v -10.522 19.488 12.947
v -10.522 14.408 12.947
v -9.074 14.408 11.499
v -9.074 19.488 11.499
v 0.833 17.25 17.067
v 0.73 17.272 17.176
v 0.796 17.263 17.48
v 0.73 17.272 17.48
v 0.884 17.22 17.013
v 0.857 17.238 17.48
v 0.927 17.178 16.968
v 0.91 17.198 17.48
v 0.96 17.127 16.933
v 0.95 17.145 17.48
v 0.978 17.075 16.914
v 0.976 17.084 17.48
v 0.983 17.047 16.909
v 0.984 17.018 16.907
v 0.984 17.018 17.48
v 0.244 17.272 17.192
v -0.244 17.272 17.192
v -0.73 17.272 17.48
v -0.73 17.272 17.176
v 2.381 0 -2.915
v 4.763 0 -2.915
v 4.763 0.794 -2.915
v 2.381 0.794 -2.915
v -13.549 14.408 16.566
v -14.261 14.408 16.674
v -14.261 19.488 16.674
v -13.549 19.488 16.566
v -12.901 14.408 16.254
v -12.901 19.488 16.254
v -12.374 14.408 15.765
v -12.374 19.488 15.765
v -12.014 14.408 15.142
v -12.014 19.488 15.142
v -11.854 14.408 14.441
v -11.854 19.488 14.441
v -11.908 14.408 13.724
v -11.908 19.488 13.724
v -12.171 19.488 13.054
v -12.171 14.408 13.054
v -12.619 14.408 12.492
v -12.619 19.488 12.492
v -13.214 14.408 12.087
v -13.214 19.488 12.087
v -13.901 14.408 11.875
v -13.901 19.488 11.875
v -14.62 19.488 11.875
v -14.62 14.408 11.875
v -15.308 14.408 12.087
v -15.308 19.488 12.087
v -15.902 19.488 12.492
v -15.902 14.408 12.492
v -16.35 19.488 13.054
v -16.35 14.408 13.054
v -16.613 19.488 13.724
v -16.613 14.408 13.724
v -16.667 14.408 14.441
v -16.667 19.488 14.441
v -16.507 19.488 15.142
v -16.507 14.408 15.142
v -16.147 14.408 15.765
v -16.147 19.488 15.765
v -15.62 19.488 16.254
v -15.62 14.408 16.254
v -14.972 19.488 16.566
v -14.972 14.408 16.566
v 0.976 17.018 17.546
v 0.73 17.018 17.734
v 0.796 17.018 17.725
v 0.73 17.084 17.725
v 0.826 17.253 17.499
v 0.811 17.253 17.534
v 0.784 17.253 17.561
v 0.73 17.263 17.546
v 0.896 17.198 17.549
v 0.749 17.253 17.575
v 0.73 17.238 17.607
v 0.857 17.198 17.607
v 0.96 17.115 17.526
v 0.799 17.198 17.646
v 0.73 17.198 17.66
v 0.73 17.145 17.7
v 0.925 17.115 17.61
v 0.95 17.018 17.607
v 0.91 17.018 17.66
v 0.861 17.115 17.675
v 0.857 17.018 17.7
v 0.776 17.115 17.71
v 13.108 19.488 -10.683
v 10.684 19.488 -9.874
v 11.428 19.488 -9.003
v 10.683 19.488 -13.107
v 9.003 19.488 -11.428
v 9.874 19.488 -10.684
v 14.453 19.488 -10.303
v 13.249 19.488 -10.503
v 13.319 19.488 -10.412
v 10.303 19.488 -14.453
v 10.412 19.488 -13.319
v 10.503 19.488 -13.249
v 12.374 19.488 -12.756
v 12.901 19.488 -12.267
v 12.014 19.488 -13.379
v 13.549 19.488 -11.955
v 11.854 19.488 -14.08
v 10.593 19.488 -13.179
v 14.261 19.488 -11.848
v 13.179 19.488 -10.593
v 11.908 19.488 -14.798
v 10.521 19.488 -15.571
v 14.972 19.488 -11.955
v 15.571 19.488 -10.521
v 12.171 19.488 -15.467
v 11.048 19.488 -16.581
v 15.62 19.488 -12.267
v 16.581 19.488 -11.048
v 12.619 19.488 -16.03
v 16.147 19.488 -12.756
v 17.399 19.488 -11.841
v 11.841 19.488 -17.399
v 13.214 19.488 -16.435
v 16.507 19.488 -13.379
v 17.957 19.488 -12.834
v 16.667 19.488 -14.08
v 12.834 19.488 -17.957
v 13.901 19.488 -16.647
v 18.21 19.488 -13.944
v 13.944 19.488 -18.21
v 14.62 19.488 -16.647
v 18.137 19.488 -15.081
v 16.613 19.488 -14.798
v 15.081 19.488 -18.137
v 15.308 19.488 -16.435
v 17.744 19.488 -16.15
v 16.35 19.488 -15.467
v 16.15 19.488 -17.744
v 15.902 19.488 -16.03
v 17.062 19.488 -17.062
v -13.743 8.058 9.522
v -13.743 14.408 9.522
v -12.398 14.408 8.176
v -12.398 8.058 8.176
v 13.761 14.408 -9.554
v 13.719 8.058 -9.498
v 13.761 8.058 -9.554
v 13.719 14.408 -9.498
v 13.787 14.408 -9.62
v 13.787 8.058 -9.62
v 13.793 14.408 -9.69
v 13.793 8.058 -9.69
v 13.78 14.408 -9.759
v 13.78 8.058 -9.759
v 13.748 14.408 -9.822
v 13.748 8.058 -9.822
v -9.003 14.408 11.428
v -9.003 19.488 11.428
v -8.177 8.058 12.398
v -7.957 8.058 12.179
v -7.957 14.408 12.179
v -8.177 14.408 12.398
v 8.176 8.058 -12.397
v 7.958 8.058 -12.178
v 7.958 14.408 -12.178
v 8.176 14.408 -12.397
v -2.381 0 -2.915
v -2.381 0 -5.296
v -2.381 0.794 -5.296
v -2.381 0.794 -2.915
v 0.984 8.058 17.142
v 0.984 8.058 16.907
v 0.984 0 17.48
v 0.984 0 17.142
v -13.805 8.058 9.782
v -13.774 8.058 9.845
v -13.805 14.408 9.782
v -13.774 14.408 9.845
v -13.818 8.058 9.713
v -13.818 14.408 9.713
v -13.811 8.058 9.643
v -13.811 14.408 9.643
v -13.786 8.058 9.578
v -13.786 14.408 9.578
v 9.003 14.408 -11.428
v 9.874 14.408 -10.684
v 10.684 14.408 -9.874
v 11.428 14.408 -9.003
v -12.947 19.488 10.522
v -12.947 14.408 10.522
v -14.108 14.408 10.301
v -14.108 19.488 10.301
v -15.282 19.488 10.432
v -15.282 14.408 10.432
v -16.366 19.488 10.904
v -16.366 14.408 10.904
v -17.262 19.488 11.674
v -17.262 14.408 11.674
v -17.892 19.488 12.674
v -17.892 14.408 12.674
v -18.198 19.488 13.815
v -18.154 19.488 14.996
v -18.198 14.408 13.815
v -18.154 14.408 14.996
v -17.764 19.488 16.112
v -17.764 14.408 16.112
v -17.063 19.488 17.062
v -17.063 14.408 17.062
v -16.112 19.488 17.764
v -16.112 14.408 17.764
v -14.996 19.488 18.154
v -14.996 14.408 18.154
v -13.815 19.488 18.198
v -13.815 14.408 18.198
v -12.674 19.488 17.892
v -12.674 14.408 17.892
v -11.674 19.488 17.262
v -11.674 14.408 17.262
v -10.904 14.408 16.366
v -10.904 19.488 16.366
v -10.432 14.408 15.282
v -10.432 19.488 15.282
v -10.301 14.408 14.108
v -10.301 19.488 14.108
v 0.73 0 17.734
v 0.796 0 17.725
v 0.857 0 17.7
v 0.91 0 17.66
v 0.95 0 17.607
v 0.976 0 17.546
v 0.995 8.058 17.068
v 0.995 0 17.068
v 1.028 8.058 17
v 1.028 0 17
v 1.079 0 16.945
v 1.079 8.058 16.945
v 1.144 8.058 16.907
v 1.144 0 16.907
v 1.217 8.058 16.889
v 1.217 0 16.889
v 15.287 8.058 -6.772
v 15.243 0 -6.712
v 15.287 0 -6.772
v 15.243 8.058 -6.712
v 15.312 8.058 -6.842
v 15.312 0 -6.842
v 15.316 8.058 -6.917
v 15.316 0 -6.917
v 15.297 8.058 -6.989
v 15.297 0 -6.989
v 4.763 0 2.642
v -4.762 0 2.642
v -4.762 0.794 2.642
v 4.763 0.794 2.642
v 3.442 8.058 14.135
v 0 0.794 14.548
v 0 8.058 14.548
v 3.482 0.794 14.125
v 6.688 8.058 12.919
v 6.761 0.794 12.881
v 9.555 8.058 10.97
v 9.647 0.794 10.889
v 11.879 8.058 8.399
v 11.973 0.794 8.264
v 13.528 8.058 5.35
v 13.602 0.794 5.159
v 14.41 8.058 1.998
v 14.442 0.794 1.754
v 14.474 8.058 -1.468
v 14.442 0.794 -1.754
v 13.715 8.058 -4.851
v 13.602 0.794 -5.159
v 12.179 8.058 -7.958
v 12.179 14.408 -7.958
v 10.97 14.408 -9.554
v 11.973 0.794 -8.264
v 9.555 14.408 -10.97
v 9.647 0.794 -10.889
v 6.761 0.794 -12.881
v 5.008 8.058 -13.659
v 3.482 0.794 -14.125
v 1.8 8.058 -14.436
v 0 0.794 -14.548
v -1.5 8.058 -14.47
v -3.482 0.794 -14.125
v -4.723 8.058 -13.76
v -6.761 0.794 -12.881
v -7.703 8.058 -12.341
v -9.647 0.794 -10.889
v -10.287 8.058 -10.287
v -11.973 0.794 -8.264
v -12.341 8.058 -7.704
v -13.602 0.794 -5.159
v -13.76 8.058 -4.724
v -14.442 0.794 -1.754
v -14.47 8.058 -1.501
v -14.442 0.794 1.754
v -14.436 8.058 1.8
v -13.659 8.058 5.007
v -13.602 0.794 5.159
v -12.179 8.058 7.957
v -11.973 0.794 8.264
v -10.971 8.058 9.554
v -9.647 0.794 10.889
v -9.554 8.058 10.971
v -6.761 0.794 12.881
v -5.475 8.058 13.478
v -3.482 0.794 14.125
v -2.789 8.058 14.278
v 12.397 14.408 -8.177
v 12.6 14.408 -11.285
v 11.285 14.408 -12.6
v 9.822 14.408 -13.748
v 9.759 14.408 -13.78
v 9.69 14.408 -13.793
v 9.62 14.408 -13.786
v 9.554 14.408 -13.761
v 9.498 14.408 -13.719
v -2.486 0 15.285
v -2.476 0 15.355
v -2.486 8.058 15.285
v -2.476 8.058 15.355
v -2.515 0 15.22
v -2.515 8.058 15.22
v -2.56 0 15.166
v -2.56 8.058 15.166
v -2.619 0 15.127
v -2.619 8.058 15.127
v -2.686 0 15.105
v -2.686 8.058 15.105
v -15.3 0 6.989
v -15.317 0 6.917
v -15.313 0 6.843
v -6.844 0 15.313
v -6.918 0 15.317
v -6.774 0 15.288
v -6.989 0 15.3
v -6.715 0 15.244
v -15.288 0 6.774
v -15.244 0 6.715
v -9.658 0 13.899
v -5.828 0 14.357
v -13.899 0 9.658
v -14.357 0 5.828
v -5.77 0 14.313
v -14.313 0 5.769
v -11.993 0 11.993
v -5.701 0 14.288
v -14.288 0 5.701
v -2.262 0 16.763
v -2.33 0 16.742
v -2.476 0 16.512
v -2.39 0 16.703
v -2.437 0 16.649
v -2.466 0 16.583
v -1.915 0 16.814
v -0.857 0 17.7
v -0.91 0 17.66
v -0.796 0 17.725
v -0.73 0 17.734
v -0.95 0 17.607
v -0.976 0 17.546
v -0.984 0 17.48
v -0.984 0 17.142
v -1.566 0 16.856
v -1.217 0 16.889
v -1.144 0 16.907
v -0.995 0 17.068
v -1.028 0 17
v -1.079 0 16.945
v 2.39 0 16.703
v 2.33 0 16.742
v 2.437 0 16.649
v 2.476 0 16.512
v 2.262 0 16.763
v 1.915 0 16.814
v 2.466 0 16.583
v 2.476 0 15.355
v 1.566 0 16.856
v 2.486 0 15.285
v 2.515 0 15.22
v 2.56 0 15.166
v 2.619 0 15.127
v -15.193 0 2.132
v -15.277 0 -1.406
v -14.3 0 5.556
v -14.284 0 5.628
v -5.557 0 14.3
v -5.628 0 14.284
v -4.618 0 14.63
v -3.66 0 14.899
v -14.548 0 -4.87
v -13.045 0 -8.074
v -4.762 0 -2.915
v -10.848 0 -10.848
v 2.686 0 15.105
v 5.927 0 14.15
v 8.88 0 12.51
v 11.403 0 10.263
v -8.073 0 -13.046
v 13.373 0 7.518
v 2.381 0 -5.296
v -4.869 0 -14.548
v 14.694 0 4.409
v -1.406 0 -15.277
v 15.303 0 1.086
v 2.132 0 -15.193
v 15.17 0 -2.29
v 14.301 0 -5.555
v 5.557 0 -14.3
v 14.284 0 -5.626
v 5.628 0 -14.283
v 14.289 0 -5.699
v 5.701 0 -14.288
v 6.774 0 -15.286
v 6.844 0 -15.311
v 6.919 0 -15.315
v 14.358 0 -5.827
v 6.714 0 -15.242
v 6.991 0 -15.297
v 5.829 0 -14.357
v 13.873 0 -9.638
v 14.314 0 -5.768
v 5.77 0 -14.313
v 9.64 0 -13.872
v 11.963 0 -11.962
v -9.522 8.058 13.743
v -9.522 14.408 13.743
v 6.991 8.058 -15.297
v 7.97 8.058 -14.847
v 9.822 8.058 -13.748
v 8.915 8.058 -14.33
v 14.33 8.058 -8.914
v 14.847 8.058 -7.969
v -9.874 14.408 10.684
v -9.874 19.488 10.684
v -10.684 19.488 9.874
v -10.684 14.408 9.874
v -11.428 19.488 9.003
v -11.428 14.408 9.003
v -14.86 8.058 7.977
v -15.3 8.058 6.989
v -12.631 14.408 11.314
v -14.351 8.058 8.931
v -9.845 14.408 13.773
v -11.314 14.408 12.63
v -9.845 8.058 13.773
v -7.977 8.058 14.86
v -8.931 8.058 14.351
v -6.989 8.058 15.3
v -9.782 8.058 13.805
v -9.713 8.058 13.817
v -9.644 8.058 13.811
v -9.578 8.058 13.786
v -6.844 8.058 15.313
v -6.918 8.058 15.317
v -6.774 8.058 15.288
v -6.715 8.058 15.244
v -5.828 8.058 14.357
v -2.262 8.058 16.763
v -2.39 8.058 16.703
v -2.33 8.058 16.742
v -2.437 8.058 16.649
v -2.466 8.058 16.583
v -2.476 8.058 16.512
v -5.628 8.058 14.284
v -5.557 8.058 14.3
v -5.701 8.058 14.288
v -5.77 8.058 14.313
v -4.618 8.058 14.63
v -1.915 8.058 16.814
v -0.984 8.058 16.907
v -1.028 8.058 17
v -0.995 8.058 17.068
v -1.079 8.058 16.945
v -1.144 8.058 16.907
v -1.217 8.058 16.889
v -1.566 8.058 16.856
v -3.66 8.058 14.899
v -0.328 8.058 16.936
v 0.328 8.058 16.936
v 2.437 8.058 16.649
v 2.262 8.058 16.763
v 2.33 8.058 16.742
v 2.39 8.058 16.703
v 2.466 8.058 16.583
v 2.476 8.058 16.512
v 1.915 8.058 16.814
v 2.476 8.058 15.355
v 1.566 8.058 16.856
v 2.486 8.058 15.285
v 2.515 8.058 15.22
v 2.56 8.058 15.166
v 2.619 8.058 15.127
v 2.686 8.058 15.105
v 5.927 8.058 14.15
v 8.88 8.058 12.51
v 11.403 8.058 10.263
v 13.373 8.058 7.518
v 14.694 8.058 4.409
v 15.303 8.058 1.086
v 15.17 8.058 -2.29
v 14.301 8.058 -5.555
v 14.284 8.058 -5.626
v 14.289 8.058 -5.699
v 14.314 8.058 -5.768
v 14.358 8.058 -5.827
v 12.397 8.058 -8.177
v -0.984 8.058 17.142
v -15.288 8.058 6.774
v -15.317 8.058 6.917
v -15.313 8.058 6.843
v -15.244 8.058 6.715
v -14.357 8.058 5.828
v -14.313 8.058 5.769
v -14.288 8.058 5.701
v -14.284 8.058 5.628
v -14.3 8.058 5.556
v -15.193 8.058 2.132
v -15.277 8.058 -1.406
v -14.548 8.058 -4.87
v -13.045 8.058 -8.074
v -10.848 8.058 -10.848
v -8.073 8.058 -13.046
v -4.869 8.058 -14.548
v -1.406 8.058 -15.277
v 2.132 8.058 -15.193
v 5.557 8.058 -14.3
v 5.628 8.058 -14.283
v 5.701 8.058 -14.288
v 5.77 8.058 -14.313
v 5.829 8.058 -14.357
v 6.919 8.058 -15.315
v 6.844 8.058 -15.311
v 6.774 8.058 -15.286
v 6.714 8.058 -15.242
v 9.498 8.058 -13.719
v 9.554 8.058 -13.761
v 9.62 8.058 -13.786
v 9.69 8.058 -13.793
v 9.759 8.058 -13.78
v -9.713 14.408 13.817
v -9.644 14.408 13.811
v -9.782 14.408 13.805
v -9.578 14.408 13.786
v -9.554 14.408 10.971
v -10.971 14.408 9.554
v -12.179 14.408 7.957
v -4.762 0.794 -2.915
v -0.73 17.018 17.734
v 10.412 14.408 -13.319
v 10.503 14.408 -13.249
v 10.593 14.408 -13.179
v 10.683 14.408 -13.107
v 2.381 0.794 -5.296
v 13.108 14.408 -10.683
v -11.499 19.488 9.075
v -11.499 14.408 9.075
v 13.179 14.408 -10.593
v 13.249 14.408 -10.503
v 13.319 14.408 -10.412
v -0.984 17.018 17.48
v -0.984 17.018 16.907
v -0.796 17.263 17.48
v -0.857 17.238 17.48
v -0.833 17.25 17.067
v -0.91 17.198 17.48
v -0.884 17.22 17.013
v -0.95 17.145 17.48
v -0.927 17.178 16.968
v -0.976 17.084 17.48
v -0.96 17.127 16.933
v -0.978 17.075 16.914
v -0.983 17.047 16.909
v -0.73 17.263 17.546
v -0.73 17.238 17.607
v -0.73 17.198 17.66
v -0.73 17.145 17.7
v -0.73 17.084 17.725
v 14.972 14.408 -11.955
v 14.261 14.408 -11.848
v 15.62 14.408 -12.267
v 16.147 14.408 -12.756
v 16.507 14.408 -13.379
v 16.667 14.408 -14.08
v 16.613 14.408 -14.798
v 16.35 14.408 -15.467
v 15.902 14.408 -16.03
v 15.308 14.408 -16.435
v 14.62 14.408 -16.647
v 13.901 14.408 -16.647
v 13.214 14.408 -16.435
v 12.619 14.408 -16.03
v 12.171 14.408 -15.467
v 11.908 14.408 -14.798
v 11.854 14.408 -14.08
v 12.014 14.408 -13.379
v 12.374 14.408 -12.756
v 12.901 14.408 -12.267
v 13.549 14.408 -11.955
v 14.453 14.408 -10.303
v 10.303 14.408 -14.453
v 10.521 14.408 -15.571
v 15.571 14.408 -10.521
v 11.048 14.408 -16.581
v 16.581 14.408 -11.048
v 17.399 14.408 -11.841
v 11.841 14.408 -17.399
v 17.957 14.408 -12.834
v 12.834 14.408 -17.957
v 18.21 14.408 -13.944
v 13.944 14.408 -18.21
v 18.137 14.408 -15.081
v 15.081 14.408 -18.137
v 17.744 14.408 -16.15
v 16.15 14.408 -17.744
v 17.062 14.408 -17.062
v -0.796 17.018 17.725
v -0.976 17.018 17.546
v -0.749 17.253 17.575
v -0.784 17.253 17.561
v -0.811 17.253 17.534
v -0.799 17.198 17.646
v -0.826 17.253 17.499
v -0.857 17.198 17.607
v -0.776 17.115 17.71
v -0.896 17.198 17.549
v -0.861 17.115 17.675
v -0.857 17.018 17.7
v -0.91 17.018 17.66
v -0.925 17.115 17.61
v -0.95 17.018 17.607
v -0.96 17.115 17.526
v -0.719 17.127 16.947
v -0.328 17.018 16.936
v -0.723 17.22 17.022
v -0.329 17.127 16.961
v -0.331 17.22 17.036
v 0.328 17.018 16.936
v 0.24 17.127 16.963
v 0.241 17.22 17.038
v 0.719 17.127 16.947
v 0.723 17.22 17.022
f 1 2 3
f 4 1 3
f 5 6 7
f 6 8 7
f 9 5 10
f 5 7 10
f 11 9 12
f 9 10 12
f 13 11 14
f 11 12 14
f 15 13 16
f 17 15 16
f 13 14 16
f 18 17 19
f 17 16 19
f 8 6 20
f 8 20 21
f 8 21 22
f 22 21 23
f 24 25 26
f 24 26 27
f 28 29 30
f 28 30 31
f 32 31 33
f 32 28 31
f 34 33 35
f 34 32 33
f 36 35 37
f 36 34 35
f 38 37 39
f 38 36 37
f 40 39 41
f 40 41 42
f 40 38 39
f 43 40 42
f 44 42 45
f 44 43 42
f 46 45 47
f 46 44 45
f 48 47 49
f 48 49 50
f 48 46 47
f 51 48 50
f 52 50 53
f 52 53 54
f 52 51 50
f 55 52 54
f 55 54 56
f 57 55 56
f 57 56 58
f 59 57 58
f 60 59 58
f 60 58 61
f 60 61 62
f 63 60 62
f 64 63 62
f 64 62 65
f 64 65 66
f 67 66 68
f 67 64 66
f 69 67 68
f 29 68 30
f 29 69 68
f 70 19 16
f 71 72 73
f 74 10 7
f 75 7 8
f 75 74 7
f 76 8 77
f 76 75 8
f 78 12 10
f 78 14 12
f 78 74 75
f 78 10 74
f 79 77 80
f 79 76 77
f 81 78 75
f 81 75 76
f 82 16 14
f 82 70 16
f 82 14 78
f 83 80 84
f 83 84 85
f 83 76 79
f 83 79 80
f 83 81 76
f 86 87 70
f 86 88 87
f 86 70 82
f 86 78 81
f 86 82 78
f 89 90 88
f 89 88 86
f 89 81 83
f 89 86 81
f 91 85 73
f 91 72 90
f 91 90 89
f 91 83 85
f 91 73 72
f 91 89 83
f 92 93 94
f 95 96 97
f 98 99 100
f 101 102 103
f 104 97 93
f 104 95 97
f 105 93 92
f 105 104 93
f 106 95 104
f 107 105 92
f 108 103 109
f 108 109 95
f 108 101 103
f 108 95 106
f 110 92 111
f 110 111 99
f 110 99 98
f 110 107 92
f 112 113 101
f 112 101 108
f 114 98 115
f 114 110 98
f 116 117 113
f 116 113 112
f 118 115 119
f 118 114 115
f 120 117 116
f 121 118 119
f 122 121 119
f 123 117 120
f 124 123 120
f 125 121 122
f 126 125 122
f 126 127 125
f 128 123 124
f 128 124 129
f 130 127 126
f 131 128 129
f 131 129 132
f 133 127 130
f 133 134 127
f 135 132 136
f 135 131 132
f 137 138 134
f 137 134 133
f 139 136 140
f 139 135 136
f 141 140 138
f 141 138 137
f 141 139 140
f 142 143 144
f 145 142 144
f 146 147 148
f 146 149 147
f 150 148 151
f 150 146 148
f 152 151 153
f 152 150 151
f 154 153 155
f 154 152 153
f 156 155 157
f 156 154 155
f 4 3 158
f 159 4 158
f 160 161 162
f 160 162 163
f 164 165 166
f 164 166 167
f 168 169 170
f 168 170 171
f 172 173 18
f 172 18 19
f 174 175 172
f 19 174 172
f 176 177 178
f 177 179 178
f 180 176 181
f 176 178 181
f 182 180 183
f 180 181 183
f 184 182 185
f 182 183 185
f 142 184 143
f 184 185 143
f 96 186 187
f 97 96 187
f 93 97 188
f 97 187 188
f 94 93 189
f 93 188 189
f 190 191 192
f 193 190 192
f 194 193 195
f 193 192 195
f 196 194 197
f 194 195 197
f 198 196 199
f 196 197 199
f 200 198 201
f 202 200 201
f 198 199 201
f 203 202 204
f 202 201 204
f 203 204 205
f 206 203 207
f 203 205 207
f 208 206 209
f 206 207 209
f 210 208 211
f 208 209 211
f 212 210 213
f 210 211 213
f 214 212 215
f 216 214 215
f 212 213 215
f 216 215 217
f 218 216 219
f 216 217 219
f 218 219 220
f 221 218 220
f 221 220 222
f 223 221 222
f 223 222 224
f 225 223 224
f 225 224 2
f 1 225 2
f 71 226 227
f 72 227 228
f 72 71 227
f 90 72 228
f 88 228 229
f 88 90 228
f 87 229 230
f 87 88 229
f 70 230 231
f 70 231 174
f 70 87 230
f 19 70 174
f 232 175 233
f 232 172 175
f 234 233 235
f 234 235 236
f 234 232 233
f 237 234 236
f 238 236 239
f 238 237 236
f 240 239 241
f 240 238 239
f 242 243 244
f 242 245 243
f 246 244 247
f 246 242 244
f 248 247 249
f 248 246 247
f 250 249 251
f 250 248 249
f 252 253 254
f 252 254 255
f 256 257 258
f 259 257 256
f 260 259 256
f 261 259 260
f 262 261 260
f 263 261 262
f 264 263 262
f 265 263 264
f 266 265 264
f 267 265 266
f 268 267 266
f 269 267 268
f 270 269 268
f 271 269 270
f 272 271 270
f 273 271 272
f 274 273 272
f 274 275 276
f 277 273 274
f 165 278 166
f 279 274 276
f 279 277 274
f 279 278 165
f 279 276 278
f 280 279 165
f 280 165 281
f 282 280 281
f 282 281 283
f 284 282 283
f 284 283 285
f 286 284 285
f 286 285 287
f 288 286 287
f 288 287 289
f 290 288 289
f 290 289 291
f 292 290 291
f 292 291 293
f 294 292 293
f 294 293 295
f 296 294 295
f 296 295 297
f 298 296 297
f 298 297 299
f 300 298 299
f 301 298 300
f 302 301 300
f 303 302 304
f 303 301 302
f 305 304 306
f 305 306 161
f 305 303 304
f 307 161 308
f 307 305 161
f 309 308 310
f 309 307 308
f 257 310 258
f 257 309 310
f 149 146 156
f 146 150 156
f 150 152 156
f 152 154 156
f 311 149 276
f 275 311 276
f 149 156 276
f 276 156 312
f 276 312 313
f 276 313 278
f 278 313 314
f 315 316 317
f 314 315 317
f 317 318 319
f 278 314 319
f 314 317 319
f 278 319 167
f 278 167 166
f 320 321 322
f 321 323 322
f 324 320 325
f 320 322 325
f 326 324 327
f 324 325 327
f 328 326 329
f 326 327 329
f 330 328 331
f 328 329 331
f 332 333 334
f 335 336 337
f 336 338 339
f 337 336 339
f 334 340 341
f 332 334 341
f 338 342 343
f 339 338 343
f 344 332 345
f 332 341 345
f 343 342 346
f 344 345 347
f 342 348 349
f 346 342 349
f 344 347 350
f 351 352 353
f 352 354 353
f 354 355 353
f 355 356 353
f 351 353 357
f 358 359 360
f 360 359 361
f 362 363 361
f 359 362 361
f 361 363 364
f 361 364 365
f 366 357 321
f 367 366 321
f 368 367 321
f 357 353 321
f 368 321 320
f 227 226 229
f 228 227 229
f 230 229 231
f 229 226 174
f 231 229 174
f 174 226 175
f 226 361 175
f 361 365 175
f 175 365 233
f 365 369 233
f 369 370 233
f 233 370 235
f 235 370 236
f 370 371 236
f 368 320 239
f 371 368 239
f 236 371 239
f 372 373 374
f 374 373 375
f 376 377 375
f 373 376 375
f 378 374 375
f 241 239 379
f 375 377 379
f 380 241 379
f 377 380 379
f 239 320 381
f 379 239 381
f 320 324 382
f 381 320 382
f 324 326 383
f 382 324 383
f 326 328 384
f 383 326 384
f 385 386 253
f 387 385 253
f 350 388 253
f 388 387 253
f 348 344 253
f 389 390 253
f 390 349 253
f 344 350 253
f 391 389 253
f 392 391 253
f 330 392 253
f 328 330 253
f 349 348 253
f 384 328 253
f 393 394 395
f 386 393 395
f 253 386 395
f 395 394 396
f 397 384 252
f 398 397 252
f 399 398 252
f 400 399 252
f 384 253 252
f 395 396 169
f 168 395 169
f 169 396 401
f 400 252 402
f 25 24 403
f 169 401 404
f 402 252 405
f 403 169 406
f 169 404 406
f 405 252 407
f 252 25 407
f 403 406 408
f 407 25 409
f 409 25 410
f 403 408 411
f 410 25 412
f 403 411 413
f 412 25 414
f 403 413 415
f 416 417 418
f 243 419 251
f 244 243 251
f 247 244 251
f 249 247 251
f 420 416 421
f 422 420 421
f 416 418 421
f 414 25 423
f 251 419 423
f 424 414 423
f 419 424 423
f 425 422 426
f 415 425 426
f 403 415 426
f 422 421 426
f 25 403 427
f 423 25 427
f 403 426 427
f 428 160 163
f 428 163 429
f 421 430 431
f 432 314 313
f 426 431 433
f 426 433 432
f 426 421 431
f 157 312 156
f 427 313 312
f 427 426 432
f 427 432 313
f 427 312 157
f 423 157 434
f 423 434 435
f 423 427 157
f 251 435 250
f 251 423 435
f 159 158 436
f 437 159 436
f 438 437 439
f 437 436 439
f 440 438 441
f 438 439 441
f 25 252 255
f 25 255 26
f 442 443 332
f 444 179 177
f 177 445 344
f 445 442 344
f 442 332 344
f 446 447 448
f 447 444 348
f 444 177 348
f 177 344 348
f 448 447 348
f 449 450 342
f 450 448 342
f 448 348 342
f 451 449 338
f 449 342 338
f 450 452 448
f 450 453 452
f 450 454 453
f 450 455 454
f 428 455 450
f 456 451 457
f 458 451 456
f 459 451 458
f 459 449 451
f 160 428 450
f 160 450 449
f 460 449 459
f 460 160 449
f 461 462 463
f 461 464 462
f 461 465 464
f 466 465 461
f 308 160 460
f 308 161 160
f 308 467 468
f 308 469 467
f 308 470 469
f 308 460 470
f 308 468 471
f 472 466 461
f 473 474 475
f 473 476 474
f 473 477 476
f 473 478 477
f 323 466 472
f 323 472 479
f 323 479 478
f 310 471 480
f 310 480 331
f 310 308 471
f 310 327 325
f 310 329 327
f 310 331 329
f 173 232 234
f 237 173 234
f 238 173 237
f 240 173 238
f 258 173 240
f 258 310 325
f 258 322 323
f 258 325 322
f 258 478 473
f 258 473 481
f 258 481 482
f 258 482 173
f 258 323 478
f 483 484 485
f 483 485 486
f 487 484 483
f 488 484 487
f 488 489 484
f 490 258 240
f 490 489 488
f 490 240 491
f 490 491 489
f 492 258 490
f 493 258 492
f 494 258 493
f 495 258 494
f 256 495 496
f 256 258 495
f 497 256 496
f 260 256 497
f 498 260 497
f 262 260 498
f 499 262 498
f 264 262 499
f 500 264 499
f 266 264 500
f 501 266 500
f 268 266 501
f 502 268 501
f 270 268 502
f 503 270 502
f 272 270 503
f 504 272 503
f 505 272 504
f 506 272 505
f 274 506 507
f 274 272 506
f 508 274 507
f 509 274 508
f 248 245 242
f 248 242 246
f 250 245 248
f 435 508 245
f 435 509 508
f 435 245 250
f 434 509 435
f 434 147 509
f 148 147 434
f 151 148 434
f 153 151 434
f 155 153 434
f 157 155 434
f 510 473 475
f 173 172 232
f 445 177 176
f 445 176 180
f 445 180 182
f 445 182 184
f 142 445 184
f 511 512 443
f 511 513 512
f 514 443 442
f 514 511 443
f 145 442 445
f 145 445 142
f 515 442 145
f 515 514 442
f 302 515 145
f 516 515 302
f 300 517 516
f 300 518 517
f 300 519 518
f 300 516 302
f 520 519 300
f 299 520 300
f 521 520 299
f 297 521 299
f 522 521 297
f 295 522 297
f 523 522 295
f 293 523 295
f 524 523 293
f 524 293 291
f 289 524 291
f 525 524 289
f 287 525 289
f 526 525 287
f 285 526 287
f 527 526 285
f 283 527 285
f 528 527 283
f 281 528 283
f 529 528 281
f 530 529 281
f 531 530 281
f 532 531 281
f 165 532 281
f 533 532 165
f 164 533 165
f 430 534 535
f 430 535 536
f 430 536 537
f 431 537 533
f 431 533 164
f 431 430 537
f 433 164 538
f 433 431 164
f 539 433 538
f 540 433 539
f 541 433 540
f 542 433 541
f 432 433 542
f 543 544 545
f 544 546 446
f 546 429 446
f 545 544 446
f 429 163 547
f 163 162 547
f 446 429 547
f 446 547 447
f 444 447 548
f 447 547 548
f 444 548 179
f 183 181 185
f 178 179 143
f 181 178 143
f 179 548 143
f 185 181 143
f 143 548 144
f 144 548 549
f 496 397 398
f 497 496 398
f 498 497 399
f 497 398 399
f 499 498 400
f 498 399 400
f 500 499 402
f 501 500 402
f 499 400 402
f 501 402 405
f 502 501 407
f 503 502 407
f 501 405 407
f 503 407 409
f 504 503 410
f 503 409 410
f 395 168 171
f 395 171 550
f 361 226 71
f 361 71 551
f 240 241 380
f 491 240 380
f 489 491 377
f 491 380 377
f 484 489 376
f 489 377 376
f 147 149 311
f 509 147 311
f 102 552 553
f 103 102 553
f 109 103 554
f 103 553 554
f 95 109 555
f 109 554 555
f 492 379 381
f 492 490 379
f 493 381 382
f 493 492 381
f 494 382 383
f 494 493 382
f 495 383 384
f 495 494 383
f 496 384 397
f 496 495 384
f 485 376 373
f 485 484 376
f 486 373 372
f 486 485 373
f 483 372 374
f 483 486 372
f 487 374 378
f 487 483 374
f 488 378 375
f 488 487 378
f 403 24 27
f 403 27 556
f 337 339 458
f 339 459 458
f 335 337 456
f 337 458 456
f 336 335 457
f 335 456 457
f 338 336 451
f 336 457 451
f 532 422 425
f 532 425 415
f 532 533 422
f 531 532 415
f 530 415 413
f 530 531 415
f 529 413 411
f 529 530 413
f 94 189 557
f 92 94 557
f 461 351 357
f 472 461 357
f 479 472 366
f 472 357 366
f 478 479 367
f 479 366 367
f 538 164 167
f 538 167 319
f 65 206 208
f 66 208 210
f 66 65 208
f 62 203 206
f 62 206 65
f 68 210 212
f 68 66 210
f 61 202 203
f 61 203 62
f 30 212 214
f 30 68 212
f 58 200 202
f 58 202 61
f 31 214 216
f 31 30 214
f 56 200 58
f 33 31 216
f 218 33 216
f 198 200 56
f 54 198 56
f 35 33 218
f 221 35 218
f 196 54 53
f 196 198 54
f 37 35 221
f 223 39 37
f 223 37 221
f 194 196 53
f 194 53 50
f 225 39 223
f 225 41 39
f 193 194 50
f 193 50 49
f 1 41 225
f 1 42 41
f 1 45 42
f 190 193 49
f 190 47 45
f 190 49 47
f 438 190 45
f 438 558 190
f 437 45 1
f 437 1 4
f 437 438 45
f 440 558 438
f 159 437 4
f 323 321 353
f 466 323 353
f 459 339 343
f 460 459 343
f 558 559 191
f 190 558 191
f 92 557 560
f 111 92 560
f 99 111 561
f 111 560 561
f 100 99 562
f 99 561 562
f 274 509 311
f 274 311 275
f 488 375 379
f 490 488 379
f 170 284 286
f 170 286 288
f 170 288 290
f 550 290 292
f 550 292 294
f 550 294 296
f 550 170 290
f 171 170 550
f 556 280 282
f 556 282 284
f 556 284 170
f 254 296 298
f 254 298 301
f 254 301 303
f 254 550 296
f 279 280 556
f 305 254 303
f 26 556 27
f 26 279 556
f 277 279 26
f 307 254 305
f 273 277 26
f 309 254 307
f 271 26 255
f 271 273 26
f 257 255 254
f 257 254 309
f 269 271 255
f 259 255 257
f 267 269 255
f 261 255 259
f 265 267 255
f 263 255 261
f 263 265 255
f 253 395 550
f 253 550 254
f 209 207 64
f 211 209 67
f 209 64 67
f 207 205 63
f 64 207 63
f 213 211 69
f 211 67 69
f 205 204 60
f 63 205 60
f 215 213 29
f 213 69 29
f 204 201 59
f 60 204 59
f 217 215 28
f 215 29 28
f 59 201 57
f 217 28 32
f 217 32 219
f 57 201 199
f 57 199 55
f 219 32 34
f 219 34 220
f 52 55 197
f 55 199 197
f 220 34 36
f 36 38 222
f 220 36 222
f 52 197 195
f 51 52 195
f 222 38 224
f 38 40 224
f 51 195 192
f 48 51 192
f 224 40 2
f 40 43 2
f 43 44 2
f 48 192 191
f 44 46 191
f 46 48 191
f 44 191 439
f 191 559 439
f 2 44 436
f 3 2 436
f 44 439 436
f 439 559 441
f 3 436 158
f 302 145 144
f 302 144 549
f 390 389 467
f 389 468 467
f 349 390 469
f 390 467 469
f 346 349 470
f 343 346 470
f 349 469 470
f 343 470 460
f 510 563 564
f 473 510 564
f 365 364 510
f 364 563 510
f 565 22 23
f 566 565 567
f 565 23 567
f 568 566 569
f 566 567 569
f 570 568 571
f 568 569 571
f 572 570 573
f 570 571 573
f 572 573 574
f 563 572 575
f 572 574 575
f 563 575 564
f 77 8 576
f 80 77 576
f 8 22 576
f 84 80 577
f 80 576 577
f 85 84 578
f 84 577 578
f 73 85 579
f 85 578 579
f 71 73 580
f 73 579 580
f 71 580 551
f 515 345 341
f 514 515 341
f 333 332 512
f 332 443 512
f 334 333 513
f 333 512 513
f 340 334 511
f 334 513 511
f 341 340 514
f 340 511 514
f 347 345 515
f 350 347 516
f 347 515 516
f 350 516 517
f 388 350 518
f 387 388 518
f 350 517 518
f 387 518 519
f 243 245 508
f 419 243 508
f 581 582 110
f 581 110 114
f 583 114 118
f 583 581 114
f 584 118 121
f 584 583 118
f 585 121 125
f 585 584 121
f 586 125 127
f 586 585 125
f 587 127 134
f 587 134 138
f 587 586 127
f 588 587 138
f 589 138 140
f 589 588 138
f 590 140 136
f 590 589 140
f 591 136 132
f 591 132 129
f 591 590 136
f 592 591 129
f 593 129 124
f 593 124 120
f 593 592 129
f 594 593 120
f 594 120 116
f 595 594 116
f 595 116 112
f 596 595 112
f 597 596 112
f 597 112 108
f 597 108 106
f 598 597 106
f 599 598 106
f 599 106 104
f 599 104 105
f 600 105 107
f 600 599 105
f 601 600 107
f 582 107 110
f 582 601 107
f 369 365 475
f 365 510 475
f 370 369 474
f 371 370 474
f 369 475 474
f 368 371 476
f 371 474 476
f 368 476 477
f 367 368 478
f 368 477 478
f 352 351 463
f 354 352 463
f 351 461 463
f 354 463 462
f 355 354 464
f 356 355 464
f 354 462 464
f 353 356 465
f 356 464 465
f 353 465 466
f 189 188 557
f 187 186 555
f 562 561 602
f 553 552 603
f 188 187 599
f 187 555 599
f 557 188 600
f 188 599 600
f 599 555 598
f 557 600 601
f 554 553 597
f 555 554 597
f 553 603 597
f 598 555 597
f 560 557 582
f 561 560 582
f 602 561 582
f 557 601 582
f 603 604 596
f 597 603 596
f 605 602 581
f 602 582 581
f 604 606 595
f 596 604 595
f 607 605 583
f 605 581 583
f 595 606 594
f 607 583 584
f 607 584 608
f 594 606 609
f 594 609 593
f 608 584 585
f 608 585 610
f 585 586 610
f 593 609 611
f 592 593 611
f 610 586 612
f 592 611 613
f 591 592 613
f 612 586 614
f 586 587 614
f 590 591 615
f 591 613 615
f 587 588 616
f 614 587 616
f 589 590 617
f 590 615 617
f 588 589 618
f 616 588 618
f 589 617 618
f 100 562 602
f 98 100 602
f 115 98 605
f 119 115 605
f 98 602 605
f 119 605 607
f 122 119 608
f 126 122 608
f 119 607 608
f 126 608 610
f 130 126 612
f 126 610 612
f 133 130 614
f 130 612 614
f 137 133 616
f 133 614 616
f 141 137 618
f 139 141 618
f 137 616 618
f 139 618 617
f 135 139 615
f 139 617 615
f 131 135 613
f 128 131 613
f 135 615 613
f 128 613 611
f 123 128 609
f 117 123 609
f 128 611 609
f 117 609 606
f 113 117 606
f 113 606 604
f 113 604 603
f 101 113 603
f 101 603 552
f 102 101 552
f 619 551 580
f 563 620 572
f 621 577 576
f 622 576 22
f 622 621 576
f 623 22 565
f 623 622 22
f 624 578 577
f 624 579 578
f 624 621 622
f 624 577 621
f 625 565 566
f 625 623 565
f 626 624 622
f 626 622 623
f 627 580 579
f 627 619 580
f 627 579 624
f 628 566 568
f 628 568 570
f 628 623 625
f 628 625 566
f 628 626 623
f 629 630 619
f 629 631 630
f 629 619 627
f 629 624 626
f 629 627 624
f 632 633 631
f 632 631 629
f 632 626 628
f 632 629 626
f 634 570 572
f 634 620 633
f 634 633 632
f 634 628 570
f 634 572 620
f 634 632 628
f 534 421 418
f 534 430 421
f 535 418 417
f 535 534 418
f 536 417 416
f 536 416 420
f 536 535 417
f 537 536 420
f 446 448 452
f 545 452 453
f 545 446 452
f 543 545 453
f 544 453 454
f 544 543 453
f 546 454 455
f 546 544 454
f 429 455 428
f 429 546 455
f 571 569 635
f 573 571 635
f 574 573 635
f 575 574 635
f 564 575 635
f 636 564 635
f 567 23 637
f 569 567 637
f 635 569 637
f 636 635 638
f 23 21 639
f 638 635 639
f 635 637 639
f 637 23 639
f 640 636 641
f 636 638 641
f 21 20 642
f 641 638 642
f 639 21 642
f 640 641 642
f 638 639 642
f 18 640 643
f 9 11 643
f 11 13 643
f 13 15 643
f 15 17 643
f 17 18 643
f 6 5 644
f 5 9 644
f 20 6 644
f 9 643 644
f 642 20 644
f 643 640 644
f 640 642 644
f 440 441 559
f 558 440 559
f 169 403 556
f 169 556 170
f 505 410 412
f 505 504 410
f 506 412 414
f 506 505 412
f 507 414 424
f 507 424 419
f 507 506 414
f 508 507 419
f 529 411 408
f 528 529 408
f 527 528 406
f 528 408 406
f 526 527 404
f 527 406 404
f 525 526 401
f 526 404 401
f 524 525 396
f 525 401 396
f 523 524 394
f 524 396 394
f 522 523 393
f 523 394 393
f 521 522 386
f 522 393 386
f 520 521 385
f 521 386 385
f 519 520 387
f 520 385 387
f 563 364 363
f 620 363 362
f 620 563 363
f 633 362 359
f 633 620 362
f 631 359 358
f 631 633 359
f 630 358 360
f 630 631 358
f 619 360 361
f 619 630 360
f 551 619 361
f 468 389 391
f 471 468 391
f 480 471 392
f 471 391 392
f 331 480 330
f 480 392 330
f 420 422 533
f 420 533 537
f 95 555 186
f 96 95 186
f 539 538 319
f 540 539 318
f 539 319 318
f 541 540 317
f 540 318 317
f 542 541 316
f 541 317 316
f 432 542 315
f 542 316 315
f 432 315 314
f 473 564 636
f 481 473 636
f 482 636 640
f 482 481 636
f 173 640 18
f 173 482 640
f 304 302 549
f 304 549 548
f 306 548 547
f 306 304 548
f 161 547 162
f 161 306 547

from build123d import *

# Parameters (mm, degrees)
SKETCH1_R             = 15.341599999999996
BOSS_EXTRUDE1_DEPTH   = 0.79375
SKETCH2_R             = 15.341599999999996
SKETCH2_R_2           = 14.547849999999999
BOSS_EXTRUDE2_DEPTH   = 7.264399999999999
CUT_EXTRUDE1_DEPTH    = 2.54
BOSS_EXTRUDE3_DEPTH   = 8.05815
BOSS_EXTRUDE4_START   = -8.05815
BOSS_EXTRUDE4_DEPTH   = 8.05815
BOSS_EXTRUDE5_DEPTH   = 9.21385
BOSS_EXTRUDE6_DEPTH   = 8.05815
BOSS_EXTRUDE7_DEPTH   = 6.35
SKETCH8_R             = 2.4130000000000007
BOSS_EXTRUDE9_DEPTH   = 5.08
BOSS_EXTRUDE9_2_DEPTH = 5.08
FILLET2_R             = 0.254
FILLET3_R             = 0.254
FILLET4_R             = 0.254
FILLET5_R             = 0.254


with BuildPart() as part:
    # Sketch1 → Boss-Extrude1 (new body)
    with BuildSketch(Plane(origin=(0, 0, 0), x_dir=(1, 0, 0), z_dir=(0, 1, 0))):
        Circle(SKETCH1_R)
    extrude(amount=BOSS_EXTRUDE1_DEPTH)

    # Sketch2 → Boss-Extrude2 (add)
    with BuildSketch(Plane(origin=(0, 0.79375, 0), x_dir=(1, 0, 0), z_dir=(0, 1, 0))):
        Circle(SKETCH2_R)
        Circle(SKETCH2_R_2, mode=Mode.SUBTRACT)
    extrude(amount=BOSS_EXTRUDE2_DEPTH)

    # Sketch3 → Cut-Extrude1 (cut)
    with BuildSketch(Plane.XZ):
        Polygon((-4.762499999999998, 2.6415999999999973), (4.762500000000002, 2.641599999999999), (4.762500000000002, -2.914650000000002), (2.38125, -2.9146500000000013), (2.3812499999999996, -5.295900000000002), (-2.3812499999999996, -5.295900000000002), (-2.38125, -2.914650000000002), (-4.762499999999998, -2.914650000000002), align=None)
    extrude(amount=-CUT_EXTRUDE1_DEPTH, mode=Mode.SUBTRACT)

    # Sketch4 → Boss-Extrude3 (add)
    with BuildSketch(Plane(origin=(0, 0, 0), x_dir=(-1, 0, 0), z_dir=(0, -1, 0))):
        with BuildLine():
            Line((2.4765, -15.140397561160668), (2.4765, -16.727897561160667))
            ThreePointArc((2.4765, -16.727897561160667), (8.9e-16, -16.94015526812513), (-2.4765, -16.727897561160667))
            Line((-2.4765, -16.727897561160667), (-2.4765, -15.140397561160668))
            ThreePointArc((-2.4765, -15.140397561160668), (9.4e-16, -15.341599999999993), (2.4765, -15.140397561160668))
        make_face()
    extrude(amount=-BOSS_EXTRUDE3_DEPTH)

    # Sketch5 → Boss-Extrude4 (add)
    with BuildSketch(Plane(origin=(0, 8.058149999999998, 0), x_dir=(1, 0, 0), z_dir=(0, 1, 0)).offset(BOSS_EXTRUDE4_START)):
        with BuildLine():
            Line((-0.9842499999999998, -17.733905268125135), (-0.9842499999999998, -16.906834389214747))
            ThreePointArc((-0.9842499999999998, -16.906834389214747), (8.9e-16, -16.94015526812513), (0.9842499999999998, -16.906834389214747))
            Line((0.9842499999999998, -16.906834389214747), (0.9842499999999998, -17.733905268125135))
            Line((0.9842499999999998, -17.733905268125135), (-0.9842499999999998, -17.733905268125135))
        make_face()
    extrude(amount=BOSS_EXTRUDE4_DEPTH)

    # Sketch5<2> → Boss-Extrude5 (add)
    with BuildSketch(Plane(origin=(0, 8.058149999999998, 0), x_dir=(1, 0, 0), z_dir=(0, 1, 0))):
        with BuildLine():
            Line((-0.9842499999999998, -17.733905268125135), (-0.9842499999999998, -16.906834389214747))
            ThreePointArc((-0.9842499999999998, -16.906834389214747), (8.9e-16, -16.94015526812513), (0.9842499999999998, -16.906834389214747))
            Line((0.9842499999999998, -16.906834389214747), (0.9842499999999998, -17.733905268125135))
            Line((0.9842499999999998, -17.733905268125135), (-0.9842499999999998, -17.733905268125135))
        make_face()
    extrude(amount=BOSS_EXTRUDE5_DEPTH)

    # Sketch6 → Boss-Extrude6 (add)
    with BuildSketch(Plane.XZ):
        with BuildLine():
            Line((-14.239356652921419, 5.7101149437557215), (-15.361888668055064, 6.832646958889366))
            ThreePointArc((-15.361888668055064, 6.832646958889366), (-11.992928475384156, 11.99273189026442), (-6.832904471189303, 15.361785400515926))
            Line((-6.832904471189303, 15.361785400515926), (-5.710372456055659, 14.239253385382282))
            ThreePointArc((-5.710372456055659, 14.239253385382282), (-10.848247486091923, 10.848051301524158), (-14.239356652921419, 5.7101149437557215))
        make_face()
        with BuildLine():
            Line((5.710770125537013, -14.239093901413598), (6.833302140670656, -15.36162591654724))
            ThreePointArc((6.833302140670656, -15.36162591654724), (11.963327436785288, -11.961742370000145), (15.362460815020862, -6.831219984723725))
            Line((15.362460815020862, -6.831219984723725), (14.239928799887219, -5.7086879695900805))
            ThreePointArc((14.239928799887219, -5.7086879695900805), (10.84894249425506, -10.847356236260815), (5.710770125537013, -14.239093901413598))
        make_face()
    extrude(amount=-BOSS_EXTRUDE6_DEPTH)

    # Sketch7 → Boss-Extrude7 (add)
    with BuildSketch(Plane(origin=(0, 8.058149999999998, 0), x_dir=(1, 0, 0), z_dir=(0, 1, 0))):
        with BuildLine():
            Line((-12.397852642860798, -8.176406827123534), (-12.178732573013406, -7.9572867572761385))
            ThreePointArc((-12.178732573013406, -7.9572867572761385), (-10.286832671216615, -10.286934101902759), (-7.957166672199454, -12.178811032828216))
            Line((-7.957166672199454, -12.178811032828216), (-8.176781042381135, -12.398425403009899))
            Line((-8.176781042381135, -12.398425403009899), (-9.67017727909579, -13.891108627568865))
            ThreePointArc((-9.67017727909579, -13.891108627568865), (-11.992935026527139, -11.992725338998914), (-13.89127343793116, -9.669930914310832))
            Line((-13.89127343793116, -9.669930914310832), (-12.397852642860798, -8.176406827123534))
        make_face()
        with BuildLine():
            Line((12.397328282013987, 8.176731564050892), (12.178513827182408, 7.957621540612922))
            ThreePointArc((12.178513827182408, 7.957621540612922), (10.286944170684611, 10.286822602325632), (7.957765463331677, 12.178419784730101))
            Line((7.957765463331677, 12.178419784730101), (8.176438491355439, 12.397035209318538))
            Line((8.176438491355439, 12.397035209318538), (9.646812923187438, 13.867409641150536))
            ThreePointArc((9.646812923187438, 13.867409641150536), (11.962673318277615, 11.962396545053053), (13.867624676203395, 9.646485365886878))
            Line((13.867624676203395, 9.646485365886878), (12.397328282013987, 8.176731564050892))
        make_face()
    extrude(amount=BOSS_EXTRUDE7_DEPTH)

    # Fillet2
    fillet2_edges = [part.edges().sort_by_distance(p)[0] for p in [
        (-2.4765, 4.029075, 15.140397561160668),
        (-2.4765, 4.029075, 16.727897561160667),
        (-0.98425, 4.029074999999998, 16.90683438921475),
        (-0.9842499999999998, 8.635999999999997, 17.733905268125135),
        (0.9842499999999998, 8.635999999999997, 17.733905268125135),
        (0.9842500000000001, 4.029074999999998, 16.90683438921475),
        (2.4765, 4.029075, 16.727897561160667),
        (2.4765, 4.029075, 15.140397561160668),
    ]]
    fillet(fillet2_edges, radius=FILLET2_R)

    # Fillet3
    fillet3_edges = [part.edges().sort_by_distance(p)[0] for p in [
        (-13.891273437931162, 11.233149999999998, 9.669930914310832),
        (-15.361888668055066, 4.029075, 6.832646958889367),
        (-14.23935665292142, 4.029075, 5.7101149437557215),
        (-9.670177279095792, 11.233149999999998, 13.891108627568865),
        (-6.832904471189303, 4.029075, 15.361785400515927),
        (-5.710372456055659, 4.029075, 14.239253385382284),
    ]]
    fillet(fillet3_edges, radius=FILLET3_R)

    # Fillet4
    fillet4_edges = [part.edges().sort_by_distance(p)[0] for p in [
        (14.239928799887219, 4.029075, -5.7086879695900805),
        (15.362460815020864, 4.029075, -6.831219984723724),
        (13.867624676203395, 11.233149999999998, -9.646485365886878),
        (9.646812923187438, 11.233149999999998, -13.867409641150537),
        (6.833302140670657, 4.029075, -15.36162591654724),
        (5.710770125537014, 4.029075, -14.239093901413598),
    ]]
    fillet(fillet4_edges, radius=FILLET4_R)

    # Fillet5
    fillet5_edges = [part.edges().sort_by_distance(p)[0] for p in [
        (1.4e-16, 17.272, 16.94015526812513),
        (0.9842499999999998, 17.272, 17.19336982866994),
        (0.9098551224213829, 17.272, 17.659510390546515),
        (0, 17.272, 17.733905268125135),
        (-0.9098551224213829, 17.272, 17.659510390546515),
        (-0.9842499999999998, 17.272, 17.19336982866994),
    ]]
    fillet(fillet5_edges, radius=FILLET5_R)


with BuildPart() as body_2:
    # Sketch8 → Boss-Extrude9 (new body)
    with BuildSketch(Plane(origin=(0, 14.408149999999997, 0), x_dir=(1, 0, 0), z_dir=(0, 1, 0))):
        with BuildLine():
            ThreePointArc((9.002861818252532, 11.427528985040922), (10.286881765415915, 10.286885007953241), (11.427526147240574, 9.002865420333293))
            Line((11.427526147240576, 9.002865420333293), (13.107599344983733, 10.682708026757702))
            ThreePointArc((13.10759934498373, 10.682708026757698), (13.214235464329633, 10.547779215134643), (13.319365450394756, 10.41167362309261))
            ThreePointArc((13.319365450394747, 10.4116736230926), (17.062486245072215, 17.062487014989735), (10.41166954987871, 13.31937208964741))
            ThreePointArc((10.411669549878741, 13.31937208964743), (10.547905513333946, 13.214140047154249), (10.682962412057378, 13.107398983766892))
            Line((10.682962412057384, 13.107398983766894), (9.002861818252532, 11.427528985040922))
        make_face()
        with Locations((14.260645098988977, 14.26064834152637)):
            Circle(SKETCH8_R, mode=Mode.SUBTRACT)
    extrude(amount=BOSS_EXTRUDE9_DEPTH)


with BuildPart() as body_3:
    # Sketch8 → Boss-Extrude9 2 (new body)
    with BuildSketch(Plane(origin=(0, 14.408149999999997, 0), x_dir=(1, 0, 0), z_dir=(0, 1, 0))):
        with BuildLine():
            Line((-11.427546404588306, -9.002839707196882), (-11.499354003559198, -9.074623095484117))
            Line((-11.499354003559198, -9.074623095484117), (-12.947051587537082, -10.522320679462))
            ThreePointArc((-12.947051587537098, -10.522320679461972), (-17.062500956215068, -17.06247230377446), (-10.522307246446418, -12.947089816829683))
            Line((-10.522307246446541, -12.947089816829621), (-9.074412769810136, -11.499143677885405))
            Line((-9.074412769810136, -11.499143677885405), (-9.002809733874312, -11.427570018081607))
            ThreePointArc((-9.002809733874315, -11.427570018081608), (-10.286869895951533, -10.286896877400084), (-11.427546404588306, -9.002839707196884))
        make_face()
        with Locations((-14.260646720257784, -14.260646720257842)):
            Circle(SKETCH8_R, mode=Mode.SUBTRACT)
    extrude(amount=BOSS_EXTRUDE9_2_DEPTH)


solid = Compound([part.part, body_2.part, body_3.part])
